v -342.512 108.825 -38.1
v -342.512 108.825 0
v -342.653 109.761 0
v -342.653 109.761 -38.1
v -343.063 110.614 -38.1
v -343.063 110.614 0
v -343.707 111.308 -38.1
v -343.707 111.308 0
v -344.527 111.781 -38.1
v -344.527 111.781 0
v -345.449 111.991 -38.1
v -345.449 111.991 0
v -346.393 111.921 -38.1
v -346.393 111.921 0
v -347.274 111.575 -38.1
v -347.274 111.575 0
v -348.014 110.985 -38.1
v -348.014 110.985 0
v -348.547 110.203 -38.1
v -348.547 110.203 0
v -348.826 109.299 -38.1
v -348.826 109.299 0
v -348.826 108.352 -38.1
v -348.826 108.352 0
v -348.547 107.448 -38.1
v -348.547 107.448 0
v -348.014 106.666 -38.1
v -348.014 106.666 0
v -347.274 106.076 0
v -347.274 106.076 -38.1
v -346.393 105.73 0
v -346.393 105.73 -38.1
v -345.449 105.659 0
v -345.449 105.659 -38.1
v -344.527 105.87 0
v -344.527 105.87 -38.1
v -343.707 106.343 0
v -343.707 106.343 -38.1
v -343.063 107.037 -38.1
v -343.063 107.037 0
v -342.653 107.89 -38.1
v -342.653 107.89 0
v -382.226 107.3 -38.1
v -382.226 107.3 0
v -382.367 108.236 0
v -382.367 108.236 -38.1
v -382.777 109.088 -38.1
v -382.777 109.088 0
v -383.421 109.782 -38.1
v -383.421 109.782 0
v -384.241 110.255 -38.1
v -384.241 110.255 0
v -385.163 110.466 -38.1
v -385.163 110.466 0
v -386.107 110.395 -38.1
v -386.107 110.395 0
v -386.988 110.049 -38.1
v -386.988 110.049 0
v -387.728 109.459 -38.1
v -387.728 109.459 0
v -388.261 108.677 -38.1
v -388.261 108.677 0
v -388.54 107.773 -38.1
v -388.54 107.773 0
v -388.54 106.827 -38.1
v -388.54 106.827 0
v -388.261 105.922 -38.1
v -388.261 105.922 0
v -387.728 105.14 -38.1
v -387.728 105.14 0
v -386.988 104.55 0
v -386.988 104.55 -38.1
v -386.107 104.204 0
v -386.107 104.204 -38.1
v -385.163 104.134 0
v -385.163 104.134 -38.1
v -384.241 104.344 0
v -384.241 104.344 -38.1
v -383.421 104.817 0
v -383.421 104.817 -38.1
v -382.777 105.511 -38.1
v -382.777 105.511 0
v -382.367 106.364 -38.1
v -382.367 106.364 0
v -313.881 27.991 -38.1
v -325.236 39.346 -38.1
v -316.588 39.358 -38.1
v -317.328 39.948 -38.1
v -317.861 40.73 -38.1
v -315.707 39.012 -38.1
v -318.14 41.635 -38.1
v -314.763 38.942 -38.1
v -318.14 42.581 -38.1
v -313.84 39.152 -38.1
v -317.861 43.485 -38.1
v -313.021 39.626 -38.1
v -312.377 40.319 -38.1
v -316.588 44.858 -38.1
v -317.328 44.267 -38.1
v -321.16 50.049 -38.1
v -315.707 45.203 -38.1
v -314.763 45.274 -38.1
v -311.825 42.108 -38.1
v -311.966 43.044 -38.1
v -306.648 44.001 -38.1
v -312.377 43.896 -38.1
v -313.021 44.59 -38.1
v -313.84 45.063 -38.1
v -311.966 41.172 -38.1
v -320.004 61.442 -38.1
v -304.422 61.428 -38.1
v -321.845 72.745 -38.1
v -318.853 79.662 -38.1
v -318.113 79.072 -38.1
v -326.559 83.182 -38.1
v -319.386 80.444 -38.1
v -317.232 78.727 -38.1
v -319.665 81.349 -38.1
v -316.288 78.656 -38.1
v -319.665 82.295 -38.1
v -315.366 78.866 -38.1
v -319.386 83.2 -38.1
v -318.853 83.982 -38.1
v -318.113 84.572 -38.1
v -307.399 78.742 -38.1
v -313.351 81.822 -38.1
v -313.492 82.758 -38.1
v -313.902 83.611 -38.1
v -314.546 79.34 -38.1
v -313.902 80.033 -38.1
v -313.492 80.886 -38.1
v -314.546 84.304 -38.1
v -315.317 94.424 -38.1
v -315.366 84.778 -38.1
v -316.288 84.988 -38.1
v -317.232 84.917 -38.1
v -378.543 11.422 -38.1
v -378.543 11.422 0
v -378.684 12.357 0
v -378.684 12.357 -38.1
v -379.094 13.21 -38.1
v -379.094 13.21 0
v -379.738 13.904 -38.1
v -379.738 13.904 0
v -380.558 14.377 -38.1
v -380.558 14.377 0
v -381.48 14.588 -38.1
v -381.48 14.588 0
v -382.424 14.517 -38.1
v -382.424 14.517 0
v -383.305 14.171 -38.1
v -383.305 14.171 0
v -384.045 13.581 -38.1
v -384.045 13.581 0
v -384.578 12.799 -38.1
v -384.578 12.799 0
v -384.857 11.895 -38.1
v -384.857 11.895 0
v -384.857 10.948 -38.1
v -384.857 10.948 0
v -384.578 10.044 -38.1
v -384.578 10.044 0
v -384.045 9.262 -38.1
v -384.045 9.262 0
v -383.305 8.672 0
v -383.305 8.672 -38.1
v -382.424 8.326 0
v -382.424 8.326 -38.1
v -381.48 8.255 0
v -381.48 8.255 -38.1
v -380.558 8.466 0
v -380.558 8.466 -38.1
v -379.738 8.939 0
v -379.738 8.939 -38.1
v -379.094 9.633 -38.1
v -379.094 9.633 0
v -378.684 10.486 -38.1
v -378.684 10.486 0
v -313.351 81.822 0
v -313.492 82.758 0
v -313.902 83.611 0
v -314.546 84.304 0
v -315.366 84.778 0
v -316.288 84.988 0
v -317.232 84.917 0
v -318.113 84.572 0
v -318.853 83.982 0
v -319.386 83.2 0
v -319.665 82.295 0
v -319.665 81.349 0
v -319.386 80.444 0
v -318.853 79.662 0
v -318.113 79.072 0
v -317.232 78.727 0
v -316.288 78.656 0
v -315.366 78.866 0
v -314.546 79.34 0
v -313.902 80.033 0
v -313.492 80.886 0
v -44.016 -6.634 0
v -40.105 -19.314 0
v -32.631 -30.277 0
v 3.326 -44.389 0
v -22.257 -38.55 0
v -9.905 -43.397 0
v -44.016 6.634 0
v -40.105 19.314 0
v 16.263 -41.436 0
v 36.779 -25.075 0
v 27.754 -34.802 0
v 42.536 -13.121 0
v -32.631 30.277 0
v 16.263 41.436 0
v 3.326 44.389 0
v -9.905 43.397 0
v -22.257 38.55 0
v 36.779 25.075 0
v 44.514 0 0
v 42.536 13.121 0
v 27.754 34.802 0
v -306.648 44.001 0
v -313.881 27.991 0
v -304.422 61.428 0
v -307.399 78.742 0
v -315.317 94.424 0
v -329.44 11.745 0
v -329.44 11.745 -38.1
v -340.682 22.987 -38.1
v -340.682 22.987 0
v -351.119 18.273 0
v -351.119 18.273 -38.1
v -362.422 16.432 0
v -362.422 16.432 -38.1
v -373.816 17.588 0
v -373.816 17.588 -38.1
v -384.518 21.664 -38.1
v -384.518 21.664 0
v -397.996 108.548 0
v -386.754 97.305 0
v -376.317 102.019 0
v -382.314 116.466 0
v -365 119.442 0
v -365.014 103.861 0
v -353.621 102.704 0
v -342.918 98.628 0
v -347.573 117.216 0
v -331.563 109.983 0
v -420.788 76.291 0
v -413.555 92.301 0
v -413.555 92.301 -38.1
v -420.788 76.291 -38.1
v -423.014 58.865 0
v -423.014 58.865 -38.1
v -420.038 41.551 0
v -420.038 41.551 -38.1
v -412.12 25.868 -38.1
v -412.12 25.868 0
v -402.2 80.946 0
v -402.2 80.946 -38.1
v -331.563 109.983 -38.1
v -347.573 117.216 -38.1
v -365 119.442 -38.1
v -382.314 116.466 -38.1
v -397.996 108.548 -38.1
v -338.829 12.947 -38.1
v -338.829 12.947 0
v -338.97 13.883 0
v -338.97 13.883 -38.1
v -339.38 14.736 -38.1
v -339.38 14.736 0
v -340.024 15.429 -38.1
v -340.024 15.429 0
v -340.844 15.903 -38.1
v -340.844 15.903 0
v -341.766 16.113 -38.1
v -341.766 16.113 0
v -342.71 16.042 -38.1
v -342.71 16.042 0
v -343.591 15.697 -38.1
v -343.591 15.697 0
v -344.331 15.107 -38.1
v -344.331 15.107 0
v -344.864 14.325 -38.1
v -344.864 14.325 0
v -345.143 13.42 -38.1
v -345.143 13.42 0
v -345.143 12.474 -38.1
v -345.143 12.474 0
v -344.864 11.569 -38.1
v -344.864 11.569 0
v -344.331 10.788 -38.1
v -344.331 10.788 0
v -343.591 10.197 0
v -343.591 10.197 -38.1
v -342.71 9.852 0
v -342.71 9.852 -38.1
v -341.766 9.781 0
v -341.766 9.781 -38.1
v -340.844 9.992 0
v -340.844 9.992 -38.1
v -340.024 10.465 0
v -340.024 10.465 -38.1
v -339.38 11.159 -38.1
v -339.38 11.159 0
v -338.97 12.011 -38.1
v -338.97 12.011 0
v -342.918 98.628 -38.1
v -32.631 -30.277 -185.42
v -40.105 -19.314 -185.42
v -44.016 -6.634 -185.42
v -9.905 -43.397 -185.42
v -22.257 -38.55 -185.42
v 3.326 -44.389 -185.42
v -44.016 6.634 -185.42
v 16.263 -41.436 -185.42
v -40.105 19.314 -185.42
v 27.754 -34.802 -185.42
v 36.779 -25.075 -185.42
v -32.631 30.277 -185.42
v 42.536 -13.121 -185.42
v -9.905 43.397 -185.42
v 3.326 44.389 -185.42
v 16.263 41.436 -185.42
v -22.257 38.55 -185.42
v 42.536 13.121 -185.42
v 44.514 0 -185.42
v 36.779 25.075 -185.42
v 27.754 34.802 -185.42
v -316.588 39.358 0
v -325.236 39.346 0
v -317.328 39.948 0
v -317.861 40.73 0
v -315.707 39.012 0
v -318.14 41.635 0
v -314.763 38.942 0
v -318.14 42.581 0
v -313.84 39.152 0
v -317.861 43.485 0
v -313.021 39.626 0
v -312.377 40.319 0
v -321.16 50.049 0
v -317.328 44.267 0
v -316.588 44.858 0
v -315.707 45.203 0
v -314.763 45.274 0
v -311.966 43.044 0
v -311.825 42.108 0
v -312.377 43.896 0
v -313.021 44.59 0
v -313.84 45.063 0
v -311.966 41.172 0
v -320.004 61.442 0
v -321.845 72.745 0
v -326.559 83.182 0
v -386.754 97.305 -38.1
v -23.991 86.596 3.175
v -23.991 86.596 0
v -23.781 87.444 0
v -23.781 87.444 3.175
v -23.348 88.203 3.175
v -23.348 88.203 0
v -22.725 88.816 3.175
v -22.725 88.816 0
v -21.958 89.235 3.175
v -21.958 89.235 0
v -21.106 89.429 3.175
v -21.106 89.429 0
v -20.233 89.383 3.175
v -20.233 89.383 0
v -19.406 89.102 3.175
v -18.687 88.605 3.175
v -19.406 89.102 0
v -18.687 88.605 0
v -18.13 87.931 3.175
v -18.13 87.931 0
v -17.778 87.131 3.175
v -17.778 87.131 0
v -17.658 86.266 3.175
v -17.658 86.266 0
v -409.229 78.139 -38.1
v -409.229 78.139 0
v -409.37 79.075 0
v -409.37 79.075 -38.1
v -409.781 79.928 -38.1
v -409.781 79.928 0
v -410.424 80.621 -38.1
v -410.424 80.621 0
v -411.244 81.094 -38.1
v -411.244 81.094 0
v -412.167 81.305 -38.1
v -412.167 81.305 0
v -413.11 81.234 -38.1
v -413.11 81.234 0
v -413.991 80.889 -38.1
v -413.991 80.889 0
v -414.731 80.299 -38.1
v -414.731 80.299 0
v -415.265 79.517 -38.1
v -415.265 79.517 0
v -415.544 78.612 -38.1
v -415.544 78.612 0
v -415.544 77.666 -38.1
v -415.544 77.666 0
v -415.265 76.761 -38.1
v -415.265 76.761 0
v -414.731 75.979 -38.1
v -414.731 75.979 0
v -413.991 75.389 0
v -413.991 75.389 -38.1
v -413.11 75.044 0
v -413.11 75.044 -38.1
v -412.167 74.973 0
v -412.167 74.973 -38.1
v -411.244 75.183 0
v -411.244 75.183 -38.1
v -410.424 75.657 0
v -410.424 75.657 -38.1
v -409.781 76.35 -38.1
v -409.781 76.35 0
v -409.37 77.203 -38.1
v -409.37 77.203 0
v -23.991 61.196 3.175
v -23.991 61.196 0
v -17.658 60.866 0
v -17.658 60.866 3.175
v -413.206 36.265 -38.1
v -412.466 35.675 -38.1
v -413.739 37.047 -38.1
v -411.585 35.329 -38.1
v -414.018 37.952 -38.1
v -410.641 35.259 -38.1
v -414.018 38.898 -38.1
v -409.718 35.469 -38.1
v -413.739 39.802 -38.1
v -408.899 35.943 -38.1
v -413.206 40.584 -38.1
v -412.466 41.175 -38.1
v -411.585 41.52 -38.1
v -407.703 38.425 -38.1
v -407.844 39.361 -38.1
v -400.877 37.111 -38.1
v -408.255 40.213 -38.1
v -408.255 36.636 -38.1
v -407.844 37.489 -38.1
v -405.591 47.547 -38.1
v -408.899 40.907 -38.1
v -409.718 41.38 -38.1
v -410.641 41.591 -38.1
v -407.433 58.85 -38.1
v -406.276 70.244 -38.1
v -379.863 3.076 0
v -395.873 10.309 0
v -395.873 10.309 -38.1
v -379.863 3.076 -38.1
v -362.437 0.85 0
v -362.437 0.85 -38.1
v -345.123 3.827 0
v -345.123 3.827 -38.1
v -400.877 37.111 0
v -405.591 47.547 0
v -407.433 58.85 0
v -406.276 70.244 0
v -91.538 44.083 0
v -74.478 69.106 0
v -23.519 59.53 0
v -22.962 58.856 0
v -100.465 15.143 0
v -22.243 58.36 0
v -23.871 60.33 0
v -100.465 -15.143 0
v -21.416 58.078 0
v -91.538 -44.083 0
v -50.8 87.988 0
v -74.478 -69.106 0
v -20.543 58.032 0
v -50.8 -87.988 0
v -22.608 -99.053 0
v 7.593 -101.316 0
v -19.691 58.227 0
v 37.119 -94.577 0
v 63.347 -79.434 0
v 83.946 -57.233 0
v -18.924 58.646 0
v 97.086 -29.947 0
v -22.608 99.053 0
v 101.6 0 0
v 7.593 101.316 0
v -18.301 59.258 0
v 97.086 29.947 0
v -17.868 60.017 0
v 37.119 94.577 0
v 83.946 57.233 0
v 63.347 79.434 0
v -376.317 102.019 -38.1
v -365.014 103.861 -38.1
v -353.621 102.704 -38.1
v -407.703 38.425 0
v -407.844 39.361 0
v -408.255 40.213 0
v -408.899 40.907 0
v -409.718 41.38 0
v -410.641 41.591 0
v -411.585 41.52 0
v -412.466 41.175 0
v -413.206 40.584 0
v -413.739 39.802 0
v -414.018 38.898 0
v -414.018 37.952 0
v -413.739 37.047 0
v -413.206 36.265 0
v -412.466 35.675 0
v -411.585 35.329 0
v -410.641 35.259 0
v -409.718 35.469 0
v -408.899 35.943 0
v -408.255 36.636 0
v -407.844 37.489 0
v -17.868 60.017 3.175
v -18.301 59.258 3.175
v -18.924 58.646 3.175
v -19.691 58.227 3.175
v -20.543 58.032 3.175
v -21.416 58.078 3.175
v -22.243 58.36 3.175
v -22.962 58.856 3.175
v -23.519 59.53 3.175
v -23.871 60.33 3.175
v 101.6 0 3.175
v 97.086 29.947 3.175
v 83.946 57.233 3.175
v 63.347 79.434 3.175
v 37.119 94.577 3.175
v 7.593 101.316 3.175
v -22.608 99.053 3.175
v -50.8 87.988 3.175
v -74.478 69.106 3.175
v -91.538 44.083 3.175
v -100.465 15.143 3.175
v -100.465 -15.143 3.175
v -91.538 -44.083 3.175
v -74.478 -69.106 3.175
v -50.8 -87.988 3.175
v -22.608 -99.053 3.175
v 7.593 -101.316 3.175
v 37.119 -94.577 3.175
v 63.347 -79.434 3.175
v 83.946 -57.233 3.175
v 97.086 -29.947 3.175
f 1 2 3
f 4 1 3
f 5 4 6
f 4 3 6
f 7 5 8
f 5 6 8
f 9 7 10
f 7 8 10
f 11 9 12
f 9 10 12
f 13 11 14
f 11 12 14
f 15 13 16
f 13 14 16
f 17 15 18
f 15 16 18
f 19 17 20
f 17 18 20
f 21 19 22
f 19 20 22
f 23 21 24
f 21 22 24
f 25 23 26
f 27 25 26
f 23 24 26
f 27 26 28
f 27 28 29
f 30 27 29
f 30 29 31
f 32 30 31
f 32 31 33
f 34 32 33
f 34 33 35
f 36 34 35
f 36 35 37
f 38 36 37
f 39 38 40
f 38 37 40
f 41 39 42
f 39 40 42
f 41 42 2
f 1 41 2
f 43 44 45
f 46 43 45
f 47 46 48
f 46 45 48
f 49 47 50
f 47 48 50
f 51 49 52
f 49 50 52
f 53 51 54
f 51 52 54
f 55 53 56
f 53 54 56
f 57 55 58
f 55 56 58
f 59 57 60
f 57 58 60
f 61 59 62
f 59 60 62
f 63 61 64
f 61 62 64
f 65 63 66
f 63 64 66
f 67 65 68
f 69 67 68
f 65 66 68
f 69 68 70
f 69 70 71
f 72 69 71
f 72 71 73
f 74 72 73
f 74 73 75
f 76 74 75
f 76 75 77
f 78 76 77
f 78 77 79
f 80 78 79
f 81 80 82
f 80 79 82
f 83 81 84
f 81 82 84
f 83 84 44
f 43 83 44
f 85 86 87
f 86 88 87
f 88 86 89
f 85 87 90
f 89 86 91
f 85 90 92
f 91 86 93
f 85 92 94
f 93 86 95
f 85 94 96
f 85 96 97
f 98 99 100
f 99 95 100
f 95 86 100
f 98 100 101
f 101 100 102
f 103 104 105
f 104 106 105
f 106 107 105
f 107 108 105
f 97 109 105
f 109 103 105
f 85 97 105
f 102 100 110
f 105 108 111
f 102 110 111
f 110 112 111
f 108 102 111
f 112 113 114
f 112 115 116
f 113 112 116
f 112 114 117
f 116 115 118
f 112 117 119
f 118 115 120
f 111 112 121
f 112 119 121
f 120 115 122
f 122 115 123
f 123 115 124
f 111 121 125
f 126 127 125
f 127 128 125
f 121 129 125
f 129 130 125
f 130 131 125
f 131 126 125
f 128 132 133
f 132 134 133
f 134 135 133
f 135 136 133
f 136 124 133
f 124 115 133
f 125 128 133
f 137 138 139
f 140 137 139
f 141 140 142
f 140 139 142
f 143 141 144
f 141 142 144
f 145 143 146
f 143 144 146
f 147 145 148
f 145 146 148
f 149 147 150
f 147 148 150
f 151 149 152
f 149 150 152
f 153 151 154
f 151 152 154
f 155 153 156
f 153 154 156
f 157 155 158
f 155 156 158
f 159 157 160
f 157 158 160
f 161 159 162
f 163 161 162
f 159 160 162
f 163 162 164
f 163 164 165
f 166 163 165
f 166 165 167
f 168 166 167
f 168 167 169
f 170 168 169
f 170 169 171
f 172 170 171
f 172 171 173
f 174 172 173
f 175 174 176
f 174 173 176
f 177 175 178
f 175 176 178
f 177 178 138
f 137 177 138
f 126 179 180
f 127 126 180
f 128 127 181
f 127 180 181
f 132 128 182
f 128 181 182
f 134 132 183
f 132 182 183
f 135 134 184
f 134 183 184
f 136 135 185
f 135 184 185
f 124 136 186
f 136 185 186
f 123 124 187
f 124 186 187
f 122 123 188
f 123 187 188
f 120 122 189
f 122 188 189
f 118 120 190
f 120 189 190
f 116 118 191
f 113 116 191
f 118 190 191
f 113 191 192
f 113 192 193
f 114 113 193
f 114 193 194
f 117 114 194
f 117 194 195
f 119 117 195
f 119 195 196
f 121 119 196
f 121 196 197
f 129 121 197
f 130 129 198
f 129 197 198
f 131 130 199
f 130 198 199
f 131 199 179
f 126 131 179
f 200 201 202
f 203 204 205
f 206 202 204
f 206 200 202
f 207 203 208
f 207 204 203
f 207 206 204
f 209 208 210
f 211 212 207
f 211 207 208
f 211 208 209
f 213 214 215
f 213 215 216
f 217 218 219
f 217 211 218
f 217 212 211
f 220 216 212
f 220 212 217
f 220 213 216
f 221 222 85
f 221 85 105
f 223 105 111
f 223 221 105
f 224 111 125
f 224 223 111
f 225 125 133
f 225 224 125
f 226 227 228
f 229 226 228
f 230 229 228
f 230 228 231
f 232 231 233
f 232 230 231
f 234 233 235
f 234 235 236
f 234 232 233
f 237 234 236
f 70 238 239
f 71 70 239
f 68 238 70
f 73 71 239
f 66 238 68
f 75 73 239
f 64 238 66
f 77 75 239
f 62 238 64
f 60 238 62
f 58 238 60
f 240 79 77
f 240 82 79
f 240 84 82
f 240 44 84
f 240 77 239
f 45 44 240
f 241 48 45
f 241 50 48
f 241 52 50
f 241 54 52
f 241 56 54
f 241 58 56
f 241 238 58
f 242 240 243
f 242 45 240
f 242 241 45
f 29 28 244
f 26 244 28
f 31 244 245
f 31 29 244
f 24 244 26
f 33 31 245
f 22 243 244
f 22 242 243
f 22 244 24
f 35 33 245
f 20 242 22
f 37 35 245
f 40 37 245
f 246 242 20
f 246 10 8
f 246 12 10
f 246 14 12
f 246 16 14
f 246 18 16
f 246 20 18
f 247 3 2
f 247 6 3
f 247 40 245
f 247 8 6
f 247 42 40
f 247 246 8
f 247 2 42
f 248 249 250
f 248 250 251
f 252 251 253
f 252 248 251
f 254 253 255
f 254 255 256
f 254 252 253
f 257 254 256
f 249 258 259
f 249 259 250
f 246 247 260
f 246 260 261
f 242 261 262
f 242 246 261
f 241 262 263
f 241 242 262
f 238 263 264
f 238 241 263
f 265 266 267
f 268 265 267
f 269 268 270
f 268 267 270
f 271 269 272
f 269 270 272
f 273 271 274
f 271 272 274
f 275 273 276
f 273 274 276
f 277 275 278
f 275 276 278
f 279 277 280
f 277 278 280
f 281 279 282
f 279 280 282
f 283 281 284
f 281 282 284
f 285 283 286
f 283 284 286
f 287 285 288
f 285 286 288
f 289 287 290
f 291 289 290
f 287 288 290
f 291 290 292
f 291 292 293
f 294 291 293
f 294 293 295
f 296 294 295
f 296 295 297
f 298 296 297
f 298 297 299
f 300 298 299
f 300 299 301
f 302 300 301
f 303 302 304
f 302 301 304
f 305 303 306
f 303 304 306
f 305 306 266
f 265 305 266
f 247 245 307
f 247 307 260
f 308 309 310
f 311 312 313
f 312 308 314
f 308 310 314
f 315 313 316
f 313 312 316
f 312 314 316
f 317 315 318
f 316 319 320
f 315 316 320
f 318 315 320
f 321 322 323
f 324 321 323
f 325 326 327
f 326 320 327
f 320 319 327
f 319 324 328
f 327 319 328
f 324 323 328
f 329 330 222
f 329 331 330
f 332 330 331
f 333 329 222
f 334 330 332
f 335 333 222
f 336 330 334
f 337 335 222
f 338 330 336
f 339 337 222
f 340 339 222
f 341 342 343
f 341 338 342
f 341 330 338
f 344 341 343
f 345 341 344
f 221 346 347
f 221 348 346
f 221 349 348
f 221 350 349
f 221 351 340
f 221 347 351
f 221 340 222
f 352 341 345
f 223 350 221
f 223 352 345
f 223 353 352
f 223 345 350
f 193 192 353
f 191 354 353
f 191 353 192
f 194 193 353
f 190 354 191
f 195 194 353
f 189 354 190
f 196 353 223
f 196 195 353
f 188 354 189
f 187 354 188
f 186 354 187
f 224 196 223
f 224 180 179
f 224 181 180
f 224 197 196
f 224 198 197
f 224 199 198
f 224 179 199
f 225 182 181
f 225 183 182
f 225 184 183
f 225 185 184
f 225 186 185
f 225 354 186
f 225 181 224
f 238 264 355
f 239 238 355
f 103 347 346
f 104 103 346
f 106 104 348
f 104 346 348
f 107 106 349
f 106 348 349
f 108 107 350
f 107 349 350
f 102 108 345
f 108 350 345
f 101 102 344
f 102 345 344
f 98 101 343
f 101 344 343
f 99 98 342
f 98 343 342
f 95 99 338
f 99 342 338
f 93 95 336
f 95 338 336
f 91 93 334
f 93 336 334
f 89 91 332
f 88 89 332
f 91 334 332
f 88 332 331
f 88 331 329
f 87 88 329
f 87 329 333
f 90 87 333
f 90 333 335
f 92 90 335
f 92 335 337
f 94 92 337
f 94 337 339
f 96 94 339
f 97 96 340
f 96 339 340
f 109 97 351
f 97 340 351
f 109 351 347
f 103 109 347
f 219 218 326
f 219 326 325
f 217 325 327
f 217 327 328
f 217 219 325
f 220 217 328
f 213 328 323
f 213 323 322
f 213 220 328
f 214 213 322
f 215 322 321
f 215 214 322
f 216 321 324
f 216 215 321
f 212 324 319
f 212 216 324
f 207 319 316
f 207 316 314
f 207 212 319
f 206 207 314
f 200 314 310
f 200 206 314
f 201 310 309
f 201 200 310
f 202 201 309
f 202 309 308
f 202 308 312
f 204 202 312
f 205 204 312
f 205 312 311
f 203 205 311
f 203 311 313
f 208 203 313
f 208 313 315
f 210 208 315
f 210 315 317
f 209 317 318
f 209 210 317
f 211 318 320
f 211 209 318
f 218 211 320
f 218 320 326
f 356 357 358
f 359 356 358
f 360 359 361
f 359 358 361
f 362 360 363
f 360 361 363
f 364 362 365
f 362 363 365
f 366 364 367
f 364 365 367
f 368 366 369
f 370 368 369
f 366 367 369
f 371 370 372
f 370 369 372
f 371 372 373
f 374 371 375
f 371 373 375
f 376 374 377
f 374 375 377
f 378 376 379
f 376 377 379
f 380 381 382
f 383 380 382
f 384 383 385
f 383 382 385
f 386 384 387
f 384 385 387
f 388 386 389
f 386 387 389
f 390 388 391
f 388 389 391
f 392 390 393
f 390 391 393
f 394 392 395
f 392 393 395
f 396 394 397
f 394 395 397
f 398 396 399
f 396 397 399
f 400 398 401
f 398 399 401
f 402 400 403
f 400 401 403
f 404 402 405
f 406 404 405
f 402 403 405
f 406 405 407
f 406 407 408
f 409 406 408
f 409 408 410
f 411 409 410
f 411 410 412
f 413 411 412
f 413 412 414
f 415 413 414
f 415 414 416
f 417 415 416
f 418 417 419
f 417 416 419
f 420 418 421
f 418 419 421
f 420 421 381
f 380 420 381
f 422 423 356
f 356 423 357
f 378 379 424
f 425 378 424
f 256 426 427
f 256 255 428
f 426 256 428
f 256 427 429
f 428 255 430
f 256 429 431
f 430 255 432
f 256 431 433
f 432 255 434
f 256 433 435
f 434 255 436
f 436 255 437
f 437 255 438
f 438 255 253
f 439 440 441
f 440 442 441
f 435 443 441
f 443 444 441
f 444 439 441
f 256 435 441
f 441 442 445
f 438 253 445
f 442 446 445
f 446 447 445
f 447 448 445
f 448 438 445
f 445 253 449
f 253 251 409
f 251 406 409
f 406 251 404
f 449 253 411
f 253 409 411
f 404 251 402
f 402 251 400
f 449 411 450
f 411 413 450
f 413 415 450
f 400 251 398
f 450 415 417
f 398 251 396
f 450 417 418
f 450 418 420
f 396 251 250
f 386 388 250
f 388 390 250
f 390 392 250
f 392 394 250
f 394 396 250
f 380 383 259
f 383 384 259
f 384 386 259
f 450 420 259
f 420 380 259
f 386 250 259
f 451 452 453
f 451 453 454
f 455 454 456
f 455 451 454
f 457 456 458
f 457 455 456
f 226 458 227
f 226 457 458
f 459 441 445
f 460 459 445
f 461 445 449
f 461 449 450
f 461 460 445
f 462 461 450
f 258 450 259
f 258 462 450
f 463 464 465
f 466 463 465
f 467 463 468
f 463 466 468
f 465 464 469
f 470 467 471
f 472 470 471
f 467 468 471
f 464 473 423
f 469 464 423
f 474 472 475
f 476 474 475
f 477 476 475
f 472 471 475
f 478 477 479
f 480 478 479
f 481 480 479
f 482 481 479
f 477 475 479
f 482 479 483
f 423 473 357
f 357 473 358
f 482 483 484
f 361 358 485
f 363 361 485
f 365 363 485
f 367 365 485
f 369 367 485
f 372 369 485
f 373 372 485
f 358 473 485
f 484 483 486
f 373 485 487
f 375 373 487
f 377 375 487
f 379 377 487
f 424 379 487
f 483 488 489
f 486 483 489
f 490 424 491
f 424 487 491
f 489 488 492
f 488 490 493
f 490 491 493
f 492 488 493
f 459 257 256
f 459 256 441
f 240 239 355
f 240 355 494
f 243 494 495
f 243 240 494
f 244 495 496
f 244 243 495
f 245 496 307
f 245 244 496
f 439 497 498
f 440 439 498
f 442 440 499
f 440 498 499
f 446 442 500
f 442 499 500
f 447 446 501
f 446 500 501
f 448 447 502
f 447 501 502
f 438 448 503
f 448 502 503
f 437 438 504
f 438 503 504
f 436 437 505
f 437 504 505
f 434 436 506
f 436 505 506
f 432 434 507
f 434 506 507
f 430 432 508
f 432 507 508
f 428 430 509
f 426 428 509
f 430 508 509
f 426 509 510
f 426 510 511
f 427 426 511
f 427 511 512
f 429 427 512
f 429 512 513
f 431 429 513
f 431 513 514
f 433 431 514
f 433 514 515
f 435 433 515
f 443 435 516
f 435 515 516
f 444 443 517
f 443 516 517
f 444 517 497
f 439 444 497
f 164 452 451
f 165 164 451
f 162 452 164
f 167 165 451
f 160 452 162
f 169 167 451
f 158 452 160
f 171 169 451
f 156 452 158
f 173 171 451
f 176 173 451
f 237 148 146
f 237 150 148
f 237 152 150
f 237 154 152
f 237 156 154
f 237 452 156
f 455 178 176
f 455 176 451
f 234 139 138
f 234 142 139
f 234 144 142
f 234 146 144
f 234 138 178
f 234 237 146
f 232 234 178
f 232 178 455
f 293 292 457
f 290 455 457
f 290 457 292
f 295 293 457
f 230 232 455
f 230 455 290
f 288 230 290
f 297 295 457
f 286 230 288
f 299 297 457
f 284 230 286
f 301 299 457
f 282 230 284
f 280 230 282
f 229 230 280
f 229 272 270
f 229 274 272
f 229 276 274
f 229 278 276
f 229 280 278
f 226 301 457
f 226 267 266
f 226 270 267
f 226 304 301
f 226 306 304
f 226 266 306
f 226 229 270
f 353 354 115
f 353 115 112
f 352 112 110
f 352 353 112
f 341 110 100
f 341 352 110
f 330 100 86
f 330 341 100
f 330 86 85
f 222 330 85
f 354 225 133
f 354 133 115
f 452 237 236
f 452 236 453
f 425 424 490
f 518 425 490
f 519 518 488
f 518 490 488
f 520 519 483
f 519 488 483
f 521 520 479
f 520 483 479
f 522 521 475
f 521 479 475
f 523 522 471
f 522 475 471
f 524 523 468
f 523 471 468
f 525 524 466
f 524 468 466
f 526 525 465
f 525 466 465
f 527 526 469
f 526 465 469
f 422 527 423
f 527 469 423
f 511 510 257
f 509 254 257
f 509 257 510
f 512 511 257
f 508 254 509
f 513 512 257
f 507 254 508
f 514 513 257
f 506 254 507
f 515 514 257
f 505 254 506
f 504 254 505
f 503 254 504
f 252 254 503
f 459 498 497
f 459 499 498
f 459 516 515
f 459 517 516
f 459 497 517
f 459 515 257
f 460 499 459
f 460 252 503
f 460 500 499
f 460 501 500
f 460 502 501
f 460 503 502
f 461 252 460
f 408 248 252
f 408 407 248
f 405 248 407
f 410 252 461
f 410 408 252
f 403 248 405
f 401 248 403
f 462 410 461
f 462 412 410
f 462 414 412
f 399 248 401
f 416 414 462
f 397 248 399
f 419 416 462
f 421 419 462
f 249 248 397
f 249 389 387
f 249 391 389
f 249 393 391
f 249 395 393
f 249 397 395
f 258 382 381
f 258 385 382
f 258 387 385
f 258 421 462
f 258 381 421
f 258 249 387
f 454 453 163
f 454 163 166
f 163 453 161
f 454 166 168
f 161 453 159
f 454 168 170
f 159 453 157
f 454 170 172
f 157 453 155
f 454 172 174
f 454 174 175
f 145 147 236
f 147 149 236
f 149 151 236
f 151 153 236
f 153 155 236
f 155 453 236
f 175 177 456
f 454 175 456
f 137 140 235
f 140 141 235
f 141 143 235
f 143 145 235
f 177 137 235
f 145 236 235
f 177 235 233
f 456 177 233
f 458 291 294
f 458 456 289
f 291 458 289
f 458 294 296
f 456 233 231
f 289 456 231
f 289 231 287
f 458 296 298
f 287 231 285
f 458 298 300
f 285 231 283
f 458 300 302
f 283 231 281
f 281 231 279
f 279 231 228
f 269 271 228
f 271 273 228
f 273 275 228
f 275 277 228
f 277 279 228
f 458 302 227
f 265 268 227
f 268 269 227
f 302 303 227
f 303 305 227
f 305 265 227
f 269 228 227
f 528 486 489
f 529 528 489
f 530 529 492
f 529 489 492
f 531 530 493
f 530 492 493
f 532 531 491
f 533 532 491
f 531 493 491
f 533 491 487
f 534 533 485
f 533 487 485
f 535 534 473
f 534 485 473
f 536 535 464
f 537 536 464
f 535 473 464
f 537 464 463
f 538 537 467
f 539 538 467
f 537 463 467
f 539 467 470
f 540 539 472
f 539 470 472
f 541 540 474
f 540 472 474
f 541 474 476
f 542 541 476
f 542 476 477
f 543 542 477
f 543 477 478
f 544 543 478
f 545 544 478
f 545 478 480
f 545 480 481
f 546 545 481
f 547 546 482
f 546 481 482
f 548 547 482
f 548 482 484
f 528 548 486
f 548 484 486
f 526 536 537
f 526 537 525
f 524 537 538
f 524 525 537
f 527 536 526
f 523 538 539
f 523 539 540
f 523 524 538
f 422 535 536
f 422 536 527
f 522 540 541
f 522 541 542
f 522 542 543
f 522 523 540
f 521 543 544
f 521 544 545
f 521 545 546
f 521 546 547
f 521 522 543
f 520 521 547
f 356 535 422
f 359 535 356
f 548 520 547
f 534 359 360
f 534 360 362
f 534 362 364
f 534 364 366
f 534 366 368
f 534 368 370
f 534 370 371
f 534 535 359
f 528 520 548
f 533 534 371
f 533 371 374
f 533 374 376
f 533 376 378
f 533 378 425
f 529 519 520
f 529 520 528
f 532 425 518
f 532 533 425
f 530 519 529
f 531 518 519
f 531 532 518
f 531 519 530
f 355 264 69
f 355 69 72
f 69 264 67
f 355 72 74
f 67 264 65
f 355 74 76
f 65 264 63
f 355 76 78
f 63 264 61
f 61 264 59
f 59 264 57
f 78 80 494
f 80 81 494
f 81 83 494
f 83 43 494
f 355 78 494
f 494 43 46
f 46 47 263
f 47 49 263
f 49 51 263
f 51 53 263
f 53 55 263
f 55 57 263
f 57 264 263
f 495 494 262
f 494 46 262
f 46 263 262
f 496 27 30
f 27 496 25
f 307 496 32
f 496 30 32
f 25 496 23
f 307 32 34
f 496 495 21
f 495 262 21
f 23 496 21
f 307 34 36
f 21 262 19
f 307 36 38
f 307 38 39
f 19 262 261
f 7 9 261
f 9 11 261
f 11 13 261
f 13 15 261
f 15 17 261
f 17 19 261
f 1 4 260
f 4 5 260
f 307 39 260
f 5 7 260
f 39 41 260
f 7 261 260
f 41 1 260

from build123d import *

# Parameters (mm, degrees)
F0_R     = 44.5135
F1_DEPTH = 185.42
F2_R     = 101.6
F3_DEPTH = 3.175
F4_R     = 3.175
F5_DEPTH = 38.1


with BuildPart() as f1:
    # F0 (on Top) → F1 (new body)
    with BuildSketch(Plane.XY):
        Circle(F0_R)
    extrude(amount=-F1_DEPTH)


with BuildPart() as f3:
    # F2 (on Top) → F3 (new body)
    with BuildSketch(Plane.XY):
        Circle(F2_R)
        with BuildLine():
            Line((-23.990947, 61.195665), (-23.990947, 86.595665))
            ThreePointArc((-23.990947, 86.595665), (-20.667868, 89.436229), (-17.658157, 86.265534))
            Line((-17.658157, 86.265534), (-17.658157, 60.865534))
            ThreePointArc((-17.658157, 60.865534), (-20.981237, 58.02497), (-23.990947, 61.195665))
        make_face(mode=Mode.SUBTRACT)
    extrude(amount=F3_DEPTH)


with BuildPart() as f5:
    # F4 (on Top) → F5 (new body)
    with BuildSketch(Plane.XY):
        with BuildLine():
            ThreePointArc((-413.555201, 92.301098), (-423.014232, 58.864802), (-412.119525, 25.868369))
            Line((-412.119525, 25.868369), (-400.877388, 37.110507))
            ThreePointArc((-400.877388, 37.110507), (-407.432908, 58.850423), (-402.200163, 80.946061))
            Line((-402.200163, 80.946061), (-413.555201, 92.301098))
        make_face()
        with Locations((-410.878425, 38.42488)):
            Circle(F4_R, mode=Mode.SUBTRACT)
        with Locations((-412.403975, 78.138972)):
            Circle(F4_R, mode=Mode.SUBTRACT)
        with BuildLine():
            ThreePointArc((-331.563365, 109.983229), (-364.999661, 119.442261), (-397.996094, 108.547554))
            Line((-397.996094, 108.547554), (-386.753956, 97.305417))
            ThreePointArc((-386.753956, 97.305417), (-365.01404, 103.860937), (-342.918402, 98.628192))
            Line((-342.918402, 98.628192), (-331.563365, 109.983229))
        make_face()
        with Locations((-385.400597, 107.299804)):
            Circle(F4_R, mode=Mode.SUBTRACT)
        with Locations((-345.686504, 108.825354)):
            Circle(F4_R, mode=Mode.SUBTRACT)
        with BuildLine():
            ThreePointArc((-313.881234, 27.991393), (-304.422202, 61.42769), (-315.316909, 94.424123))
            Line((-315.316909, 94.424123), (-326.559046, 83.181985))
            ThreePointArc((-326.559046, 83.181985), (-320.003526, 61.442068), (-325.236271, 39.346431))
            Line((-325.236271, 39.346431), (-313.881234, 27.991393))
        make_face()
        with Locations((-315.000124, 42.107883)):
            Circle(F4_R, mode=Mode.SUBTRACT)
        with Locations((-316.525673, 81.821976)):
            Circle(F4_R, mode=Mode.SUBTRACT)
        with BuildLine():
            ThreePointArc((-395.87307, 10.309262), (-362.436773, 0.850231), (-329.44034, 11.744938))
            Line((-329.44034, 11.744938), (-340.682478, 22.987075))
            ThreePointArc((-340.682478, 22.987075), (-362.422395, 16.431555), (-384.518032, 21.6643))
            Line((-384.518032, 21.6643), (-395.87307, 10.309262))
        make_face()
        with Locations((-381.717594, 11.421502)):
            Circle(F4_R, mode=Mode.SUBTRACT)
        with Locations((-342.003501, 12.947052)):
            Circle(F4_R, mode=Mode.SUBTRACT)
    extrude(amount=-F5_DEPTH)


solid = Compound([f1.part, f3.part, f5.part])
